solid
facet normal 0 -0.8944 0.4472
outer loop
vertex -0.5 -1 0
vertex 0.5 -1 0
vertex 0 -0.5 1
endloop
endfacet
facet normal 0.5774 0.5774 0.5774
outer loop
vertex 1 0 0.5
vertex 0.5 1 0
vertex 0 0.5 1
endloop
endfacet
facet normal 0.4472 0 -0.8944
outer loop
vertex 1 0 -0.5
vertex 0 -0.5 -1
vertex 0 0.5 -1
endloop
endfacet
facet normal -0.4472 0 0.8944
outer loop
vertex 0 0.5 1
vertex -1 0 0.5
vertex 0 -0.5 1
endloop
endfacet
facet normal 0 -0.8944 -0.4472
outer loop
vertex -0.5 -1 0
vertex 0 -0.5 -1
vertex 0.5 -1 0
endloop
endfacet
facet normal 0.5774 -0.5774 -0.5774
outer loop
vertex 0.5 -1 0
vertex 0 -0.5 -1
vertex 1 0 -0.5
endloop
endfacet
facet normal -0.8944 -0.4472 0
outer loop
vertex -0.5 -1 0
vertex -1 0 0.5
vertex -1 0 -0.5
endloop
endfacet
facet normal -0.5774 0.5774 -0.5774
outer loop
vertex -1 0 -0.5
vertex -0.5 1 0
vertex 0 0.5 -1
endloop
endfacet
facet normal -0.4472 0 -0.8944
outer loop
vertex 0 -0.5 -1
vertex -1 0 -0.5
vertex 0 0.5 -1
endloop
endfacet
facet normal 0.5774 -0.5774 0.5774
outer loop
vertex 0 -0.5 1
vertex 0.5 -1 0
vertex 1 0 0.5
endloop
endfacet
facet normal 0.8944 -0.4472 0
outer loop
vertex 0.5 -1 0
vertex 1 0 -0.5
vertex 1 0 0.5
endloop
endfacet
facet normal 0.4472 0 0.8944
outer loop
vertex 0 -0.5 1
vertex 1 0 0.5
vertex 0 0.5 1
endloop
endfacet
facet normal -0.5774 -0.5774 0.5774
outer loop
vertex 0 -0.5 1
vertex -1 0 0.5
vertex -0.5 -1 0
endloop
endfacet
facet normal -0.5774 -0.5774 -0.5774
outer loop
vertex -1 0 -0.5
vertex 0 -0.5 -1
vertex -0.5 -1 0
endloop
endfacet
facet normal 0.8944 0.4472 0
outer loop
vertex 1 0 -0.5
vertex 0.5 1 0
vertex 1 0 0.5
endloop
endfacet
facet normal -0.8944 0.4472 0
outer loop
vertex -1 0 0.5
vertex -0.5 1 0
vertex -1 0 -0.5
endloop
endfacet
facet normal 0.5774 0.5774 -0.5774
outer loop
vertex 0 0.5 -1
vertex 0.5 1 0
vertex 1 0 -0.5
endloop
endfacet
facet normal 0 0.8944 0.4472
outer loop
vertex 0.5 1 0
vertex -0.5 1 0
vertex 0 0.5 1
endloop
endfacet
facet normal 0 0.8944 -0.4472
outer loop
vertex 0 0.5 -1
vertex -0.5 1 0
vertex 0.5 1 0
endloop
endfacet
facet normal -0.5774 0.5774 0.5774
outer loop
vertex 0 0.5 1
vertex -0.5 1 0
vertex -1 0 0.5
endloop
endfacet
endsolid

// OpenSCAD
hull(){cube([0.00001,1,2],true);
cube([1,2,0.0001],true);
cube([2,0.00001,1],true);}
